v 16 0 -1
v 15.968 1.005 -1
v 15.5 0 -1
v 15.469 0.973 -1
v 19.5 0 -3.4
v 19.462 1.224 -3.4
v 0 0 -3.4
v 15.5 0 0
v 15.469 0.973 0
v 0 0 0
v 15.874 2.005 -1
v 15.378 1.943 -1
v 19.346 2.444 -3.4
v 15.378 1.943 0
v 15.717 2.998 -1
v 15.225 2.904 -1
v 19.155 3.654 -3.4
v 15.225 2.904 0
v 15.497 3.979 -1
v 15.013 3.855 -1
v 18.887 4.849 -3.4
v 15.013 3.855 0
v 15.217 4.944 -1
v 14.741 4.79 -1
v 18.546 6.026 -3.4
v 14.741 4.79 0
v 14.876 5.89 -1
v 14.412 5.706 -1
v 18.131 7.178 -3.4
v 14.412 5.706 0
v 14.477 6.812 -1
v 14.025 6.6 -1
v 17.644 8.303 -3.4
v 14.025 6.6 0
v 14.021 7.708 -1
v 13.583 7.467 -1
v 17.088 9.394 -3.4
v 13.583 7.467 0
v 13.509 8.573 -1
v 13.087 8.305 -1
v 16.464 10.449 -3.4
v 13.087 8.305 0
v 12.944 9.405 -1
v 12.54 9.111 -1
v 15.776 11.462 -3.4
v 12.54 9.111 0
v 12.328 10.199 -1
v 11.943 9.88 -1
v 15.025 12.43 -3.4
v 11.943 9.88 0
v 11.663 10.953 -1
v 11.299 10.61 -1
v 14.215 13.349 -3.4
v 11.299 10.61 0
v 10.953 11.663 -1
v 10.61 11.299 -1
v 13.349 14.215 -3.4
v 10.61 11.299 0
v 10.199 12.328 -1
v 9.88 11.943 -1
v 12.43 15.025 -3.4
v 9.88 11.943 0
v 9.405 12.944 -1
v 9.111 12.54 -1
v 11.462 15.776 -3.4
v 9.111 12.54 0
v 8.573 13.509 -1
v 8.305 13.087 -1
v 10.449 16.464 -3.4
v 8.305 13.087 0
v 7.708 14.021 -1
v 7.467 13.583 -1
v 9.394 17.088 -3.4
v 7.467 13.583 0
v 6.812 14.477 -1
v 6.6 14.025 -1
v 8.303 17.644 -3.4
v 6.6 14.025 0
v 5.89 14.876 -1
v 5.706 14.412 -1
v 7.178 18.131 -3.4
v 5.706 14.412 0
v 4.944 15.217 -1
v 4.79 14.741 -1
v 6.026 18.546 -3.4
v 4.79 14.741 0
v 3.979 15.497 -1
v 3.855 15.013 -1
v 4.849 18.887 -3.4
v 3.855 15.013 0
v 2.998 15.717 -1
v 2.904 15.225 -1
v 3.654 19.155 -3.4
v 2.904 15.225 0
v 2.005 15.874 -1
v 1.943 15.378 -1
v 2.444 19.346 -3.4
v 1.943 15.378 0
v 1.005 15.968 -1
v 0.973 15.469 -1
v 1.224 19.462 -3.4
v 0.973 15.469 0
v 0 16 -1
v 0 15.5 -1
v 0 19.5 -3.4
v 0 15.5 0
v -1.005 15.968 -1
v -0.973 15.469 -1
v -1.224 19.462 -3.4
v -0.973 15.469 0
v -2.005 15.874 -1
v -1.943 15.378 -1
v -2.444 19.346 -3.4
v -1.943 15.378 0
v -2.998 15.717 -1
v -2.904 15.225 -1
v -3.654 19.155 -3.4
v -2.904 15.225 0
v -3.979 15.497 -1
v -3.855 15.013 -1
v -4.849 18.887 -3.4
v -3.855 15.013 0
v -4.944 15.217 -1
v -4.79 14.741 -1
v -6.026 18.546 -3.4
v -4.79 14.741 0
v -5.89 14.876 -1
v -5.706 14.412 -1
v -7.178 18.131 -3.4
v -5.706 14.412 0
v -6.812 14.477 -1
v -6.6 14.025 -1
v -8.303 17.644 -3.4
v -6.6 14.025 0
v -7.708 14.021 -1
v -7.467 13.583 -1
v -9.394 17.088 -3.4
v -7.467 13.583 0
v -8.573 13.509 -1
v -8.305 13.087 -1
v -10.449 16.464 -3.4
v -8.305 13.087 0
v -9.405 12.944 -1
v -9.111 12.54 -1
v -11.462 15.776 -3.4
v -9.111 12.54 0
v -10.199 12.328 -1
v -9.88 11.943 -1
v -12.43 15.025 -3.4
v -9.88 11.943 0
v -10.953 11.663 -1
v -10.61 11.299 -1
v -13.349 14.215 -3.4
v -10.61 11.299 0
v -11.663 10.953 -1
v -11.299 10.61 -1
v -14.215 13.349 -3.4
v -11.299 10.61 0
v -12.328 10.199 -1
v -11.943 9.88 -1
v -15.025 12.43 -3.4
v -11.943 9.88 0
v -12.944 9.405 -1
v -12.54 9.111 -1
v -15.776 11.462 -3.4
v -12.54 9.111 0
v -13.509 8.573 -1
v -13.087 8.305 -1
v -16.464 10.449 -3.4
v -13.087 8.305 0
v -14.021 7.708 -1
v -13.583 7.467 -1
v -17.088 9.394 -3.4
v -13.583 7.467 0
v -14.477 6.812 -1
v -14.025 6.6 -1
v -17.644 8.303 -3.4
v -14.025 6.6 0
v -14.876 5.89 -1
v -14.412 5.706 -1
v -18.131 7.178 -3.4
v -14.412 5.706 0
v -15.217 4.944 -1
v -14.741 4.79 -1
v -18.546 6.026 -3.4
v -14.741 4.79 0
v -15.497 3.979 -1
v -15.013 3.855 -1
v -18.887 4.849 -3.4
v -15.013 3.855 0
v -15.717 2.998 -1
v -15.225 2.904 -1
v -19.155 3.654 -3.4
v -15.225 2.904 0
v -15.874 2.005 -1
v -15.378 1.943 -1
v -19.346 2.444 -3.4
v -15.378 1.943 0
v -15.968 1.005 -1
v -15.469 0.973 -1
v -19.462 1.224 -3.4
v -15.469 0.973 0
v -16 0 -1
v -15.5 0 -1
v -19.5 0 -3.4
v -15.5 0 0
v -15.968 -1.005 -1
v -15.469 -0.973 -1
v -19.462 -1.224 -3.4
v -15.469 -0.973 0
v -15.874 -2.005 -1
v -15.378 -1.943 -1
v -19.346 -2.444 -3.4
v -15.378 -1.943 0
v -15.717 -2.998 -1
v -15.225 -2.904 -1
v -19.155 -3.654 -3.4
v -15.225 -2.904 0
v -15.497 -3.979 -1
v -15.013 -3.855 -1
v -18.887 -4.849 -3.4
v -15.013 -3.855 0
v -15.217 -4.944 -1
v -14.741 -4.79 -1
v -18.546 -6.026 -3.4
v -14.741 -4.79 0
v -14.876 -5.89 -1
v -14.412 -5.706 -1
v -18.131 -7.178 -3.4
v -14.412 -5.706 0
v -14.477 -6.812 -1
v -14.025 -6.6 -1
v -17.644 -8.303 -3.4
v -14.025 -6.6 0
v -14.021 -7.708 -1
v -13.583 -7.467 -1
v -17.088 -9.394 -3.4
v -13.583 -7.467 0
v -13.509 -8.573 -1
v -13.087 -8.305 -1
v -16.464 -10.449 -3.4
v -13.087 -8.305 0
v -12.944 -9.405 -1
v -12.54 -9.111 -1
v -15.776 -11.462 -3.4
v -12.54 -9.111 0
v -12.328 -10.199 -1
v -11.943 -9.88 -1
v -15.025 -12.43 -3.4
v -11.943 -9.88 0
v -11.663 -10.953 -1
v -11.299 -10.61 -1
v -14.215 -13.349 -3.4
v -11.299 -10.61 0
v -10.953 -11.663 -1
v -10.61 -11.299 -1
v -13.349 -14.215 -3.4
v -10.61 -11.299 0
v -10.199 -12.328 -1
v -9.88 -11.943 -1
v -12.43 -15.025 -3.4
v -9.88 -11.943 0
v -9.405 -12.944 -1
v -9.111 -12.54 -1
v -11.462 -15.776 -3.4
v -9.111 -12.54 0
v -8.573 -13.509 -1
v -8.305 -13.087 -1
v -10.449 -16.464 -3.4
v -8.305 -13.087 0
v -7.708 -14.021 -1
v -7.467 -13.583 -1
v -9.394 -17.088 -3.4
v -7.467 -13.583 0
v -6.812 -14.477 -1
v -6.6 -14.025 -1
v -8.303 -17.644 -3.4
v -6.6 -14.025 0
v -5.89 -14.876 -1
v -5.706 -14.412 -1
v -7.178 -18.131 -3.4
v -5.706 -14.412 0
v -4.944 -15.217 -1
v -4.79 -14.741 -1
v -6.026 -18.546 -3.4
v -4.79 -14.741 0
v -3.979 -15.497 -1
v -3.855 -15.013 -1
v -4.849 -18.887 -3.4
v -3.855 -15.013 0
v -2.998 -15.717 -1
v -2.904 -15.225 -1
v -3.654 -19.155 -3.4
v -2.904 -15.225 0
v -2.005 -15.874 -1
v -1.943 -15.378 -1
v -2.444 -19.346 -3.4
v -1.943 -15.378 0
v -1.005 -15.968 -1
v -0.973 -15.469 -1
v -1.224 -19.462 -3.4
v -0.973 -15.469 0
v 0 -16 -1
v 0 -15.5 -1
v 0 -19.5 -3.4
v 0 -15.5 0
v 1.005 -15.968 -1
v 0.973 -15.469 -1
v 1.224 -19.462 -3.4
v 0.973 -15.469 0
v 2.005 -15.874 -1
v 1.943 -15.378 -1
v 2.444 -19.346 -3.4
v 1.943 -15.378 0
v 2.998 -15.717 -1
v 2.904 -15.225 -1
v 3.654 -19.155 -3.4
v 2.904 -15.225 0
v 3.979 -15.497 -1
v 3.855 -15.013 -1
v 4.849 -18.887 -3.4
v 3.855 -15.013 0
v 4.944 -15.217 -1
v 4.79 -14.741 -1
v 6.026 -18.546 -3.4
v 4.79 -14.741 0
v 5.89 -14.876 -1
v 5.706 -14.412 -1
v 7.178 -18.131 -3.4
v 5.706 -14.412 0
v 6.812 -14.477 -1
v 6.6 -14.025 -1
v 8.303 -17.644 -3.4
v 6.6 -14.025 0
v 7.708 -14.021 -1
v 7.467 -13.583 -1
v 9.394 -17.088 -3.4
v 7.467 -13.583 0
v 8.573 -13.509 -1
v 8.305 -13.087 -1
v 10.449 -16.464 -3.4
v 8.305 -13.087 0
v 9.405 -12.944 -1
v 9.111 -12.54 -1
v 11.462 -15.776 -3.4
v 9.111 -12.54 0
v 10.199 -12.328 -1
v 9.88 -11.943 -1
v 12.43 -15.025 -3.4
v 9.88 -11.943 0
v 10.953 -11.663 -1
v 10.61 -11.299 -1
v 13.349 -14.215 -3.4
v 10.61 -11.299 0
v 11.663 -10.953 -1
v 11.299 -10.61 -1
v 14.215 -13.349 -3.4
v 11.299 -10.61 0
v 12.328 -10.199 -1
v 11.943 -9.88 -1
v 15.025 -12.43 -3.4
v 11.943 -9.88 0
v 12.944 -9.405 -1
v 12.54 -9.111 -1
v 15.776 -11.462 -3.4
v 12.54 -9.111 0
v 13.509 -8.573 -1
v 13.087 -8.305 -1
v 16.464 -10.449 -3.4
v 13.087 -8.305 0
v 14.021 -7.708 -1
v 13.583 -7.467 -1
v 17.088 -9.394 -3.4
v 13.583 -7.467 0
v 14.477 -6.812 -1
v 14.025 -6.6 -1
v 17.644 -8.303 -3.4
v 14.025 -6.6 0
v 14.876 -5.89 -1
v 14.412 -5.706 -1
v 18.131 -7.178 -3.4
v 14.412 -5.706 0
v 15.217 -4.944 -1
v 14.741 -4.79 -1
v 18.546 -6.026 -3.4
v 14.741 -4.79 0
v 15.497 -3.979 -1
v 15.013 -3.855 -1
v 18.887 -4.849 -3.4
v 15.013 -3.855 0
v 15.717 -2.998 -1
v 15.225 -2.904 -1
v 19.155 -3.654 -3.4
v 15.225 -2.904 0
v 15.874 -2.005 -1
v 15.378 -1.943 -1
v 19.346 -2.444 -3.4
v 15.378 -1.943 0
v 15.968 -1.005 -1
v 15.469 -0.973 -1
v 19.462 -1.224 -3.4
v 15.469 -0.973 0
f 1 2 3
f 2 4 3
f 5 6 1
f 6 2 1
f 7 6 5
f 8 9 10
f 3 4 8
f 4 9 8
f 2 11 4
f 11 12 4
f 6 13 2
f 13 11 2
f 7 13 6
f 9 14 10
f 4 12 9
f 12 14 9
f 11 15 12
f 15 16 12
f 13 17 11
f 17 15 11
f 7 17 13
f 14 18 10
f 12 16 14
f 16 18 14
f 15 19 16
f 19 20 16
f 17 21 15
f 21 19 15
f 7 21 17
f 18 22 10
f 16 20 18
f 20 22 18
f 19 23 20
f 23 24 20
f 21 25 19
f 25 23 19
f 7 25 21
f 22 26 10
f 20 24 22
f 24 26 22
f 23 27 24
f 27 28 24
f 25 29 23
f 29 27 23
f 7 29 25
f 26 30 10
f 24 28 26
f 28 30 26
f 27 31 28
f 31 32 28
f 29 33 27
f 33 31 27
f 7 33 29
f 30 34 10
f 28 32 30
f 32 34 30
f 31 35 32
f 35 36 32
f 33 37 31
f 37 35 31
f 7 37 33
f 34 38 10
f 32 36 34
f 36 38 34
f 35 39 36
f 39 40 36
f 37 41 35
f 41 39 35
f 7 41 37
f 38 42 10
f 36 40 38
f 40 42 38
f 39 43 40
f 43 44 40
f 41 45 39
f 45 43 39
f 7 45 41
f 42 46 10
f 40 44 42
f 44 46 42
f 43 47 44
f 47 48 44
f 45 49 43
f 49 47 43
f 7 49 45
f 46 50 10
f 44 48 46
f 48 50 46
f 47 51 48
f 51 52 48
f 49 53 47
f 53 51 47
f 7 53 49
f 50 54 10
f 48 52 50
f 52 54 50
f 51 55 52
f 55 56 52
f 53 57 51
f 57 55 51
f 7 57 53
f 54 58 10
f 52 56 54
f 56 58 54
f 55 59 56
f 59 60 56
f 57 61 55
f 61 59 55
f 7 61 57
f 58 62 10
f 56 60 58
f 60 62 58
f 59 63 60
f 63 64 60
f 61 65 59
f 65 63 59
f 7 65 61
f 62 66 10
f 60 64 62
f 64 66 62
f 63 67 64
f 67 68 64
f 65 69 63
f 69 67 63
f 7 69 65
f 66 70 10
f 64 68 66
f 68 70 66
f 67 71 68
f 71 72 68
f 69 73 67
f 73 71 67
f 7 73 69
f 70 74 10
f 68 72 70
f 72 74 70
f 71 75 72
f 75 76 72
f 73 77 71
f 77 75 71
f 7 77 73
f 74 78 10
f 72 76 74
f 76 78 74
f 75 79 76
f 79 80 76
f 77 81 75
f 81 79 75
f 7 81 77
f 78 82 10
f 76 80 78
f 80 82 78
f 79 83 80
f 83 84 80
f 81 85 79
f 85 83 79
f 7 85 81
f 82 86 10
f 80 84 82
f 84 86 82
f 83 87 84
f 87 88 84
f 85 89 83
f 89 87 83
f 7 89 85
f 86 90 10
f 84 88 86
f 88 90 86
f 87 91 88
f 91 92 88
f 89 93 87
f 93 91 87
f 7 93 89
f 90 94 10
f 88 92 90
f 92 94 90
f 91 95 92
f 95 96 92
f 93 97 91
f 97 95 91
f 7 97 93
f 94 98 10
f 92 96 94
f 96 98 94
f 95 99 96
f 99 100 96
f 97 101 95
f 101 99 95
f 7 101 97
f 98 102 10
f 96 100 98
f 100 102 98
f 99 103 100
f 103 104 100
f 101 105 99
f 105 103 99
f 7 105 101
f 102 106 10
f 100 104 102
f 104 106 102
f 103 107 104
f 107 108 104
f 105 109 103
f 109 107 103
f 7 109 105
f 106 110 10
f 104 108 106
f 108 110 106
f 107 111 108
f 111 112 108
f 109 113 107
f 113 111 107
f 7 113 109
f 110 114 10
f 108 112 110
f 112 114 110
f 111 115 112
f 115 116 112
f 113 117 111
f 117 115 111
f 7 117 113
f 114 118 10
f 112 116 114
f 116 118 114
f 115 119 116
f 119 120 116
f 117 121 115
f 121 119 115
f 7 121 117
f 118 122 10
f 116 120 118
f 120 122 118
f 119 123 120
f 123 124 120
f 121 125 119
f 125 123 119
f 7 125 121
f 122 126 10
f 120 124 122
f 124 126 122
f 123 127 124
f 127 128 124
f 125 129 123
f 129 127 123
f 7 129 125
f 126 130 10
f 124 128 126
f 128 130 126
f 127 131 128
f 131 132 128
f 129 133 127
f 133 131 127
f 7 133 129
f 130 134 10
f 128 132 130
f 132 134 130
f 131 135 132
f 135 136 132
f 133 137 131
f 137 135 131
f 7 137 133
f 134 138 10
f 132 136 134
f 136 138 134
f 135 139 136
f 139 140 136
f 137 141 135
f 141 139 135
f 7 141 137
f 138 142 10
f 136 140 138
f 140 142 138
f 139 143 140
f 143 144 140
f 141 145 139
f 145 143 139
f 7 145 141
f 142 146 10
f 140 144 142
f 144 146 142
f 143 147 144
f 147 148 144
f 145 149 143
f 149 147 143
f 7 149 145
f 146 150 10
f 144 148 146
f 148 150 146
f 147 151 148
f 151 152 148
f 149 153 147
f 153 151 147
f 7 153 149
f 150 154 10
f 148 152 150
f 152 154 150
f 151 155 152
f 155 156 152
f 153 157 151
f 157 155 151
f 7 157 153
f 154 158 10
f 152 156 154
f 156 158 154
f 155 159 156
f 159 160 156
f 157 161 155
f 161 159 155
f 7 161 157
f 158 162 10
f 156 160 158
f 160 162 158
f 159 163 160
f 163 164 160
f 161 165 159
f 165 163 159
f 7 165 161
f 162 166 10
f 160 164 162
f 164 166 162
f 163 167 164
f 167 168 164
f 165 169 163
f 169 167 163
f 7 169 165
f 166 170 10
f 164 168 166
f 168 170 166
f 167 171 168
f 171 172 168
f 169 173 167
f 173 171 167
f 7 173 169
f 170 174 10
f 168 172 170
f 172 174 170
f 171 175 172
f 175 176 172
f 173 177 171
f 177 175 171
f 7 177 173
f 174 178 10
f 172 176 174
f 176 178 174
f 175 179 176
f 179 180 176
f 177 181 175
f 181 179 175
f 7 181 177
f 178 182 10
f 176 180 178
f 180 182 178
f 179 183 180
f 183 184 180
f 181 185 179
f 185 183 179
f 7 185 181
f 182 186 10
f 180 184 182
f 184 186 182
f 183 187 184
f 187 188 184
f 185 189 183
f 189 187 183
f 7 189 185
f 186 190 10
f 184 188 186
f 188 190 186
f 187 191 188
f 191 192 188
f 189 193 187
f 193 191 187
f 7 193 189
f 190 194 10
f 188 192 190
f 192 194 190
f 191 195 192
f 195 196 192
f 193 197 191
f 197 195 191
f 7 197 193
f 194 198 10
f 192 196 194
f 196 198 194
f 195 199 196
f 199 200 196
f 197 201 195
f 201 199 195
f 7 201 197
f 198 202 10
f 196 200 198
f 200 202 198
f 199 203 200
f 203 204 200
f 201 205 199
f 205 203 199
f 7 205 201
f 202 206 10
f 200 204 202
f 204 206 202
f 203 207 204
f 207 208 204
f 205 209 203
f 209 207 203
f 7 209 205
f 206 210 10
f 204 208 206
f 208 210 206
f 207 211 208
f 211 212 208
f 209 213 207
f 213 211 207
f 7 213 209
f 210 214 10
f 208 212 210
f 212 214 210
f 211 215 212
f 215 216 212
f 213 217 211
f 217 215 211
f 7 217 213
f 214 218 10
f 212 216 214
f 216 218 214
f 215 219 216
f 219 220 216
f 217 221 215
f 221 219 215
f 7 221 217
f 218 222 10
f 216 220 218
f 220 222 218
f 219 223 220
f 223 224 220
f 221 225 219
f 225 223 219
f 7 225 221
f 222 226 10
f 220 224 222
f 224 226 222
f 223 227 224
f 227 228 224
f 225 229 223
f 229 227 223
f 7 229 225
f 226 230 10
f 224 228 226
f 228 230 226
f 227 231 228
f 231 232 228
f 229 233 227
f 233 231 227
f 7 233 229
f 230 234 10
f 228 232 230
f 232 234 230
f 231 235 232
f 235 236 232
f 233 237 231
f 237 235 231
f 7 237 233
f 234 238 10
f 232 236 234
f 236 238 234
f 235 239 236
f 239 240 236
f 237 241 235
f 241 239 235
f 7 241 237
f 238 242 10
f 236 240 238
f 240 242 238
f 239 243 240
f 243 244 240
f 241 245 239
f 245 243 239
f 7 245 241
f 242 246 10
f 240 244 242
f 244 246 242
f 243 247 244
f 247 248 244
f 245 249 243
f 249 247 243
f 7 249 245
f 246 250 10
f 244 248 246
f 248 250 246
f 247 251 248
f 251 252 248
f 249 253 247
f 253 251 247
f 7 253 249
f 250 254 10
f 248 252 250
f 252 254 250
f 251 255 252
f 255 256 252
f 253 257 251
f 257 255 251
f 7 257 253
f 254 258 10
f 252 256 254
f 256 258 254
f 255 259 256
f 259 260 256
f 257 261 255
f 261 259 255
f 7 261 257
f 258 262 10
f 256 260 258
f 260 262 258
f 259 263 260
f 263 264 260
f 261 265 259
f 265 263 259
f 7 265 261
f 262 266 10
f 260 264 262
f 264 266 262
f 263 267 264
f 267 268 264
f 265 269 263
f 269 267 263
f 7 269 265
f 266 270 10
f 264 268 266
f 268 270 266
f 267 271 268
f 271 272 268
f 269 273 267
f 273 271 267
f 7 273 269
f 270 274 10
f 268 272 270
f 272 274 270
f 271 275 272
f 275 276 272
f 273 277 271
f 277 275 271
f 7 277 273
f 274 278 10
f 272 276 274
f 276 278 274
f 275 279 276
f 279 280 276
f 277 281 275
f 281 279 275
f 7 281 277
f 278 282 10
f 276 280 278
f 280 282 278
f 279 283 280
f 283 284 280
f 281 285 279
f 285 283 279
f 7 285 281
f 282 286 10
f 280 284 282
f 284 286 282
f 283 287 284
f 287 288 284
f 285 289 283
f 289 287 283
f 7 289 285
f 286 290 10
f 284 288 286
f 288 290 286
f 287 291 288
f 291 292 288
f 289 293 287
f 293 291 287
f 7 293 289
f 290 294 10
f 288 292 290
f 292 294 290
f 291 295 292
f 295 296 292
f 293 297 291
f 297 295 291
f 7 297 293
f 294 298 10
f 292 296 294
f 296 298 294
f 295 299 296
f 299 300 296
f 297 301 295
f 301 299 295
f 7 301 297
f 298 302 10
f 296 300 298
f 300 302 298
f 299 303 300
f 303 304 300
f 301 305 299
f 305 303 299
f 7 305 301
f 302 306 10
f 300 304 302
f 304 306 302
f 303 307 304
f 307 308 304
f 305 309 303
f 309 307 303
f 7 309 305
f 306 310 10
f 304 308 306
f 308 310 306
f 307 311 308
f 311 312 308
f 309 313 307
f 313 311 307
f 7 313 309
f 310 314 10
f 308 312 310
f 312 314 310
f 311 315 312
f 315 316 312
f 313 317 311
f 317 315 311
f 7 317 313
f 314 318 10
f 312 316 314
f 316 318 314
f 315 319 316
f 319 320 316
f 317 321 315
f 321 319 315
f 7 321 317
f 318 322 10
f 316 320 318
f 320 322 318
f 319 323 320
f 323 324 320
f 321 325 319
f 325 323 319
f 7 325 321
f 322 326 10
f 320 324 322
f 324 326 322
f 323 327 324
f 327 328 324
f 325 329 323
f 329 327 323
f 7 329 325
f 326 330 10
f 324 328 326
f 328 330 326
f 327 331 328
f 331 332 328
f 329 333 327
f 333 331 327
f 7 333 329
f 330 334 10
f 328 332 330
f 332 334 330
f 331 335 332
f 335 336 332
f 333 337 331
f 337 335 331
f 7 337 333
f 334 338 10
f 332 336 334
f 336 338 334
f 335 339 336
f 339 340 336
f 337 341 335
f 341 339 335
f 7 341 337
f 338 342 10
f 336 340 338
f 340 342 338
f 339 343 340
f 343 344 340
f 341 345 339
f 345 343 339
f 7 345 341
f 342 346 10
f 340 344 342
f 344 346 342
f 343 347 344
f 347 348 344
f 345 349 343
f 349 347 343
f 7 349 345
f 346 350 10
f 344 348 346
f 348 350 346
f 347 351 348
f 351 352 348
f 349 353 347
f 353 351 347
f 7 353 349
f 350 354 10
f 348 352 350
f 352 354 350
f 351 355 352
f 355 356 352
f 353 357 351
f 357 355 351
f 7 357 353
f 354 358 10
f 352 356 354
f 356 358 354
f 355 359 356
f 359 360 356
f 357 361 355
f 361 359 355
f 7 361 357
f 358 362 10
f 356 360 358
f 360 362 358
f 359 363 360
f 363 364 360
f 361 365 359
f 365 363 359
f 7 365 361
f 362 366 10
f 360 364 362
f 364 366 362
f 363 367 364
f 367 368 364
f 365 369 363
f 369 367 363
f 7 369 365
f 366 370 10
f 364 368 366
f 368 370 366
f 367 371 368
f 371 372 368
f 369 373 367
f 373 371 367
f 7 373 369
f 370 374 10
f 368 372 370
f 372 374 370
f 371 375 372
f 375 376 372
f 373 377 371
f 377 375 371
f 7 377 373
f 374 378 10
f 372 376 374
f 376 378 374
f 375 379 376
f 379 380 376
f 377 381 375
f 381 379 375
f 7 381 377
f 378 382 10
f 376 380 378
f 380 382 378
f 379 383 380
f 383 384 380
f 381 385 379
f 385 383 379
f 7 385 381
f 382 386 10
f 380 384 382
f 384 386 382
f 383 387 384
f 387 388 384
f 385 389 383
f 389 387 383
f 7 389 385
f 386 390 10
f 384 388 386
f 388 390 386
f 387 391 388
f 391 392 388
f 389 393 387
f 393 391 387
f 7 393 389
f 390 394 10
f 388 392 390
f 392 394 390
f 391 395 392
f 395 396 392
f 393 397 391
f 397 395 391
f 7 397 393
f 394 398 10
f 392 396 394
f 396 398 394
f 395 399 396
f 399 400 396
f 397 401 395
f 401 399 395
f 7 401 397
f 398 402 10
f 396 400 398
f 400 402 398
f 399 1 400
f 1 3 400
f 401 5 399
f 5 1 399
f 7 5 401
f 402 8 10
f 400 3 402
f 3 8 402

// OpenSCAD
$fn=100;

// This is a blank cap for aerobed hydroponics gardens
//My printer is printing 1mm too small in X, Y.  
mainRad = (38+1)/2;
insideRad = (31+1)/2;
lipheight = 2.4;
ringinset = 0.5;
ringheight = 1;
//make a polygon for the crosssection.  We'll rotate it to get the full item.

pointArry = [[mainRad, lipheight+ringheight],
            [0, lipheight+ringheight],
            [0,0],
            [insideRad-ringinset, 0],
            [insideRad-ringinset, ringheight],
            [insideRad, ringheight],
            [mainRad, lipheight+ringheight]];

rotate([0,180,0]) rotate_extrude() polygon(points = pointArry);
